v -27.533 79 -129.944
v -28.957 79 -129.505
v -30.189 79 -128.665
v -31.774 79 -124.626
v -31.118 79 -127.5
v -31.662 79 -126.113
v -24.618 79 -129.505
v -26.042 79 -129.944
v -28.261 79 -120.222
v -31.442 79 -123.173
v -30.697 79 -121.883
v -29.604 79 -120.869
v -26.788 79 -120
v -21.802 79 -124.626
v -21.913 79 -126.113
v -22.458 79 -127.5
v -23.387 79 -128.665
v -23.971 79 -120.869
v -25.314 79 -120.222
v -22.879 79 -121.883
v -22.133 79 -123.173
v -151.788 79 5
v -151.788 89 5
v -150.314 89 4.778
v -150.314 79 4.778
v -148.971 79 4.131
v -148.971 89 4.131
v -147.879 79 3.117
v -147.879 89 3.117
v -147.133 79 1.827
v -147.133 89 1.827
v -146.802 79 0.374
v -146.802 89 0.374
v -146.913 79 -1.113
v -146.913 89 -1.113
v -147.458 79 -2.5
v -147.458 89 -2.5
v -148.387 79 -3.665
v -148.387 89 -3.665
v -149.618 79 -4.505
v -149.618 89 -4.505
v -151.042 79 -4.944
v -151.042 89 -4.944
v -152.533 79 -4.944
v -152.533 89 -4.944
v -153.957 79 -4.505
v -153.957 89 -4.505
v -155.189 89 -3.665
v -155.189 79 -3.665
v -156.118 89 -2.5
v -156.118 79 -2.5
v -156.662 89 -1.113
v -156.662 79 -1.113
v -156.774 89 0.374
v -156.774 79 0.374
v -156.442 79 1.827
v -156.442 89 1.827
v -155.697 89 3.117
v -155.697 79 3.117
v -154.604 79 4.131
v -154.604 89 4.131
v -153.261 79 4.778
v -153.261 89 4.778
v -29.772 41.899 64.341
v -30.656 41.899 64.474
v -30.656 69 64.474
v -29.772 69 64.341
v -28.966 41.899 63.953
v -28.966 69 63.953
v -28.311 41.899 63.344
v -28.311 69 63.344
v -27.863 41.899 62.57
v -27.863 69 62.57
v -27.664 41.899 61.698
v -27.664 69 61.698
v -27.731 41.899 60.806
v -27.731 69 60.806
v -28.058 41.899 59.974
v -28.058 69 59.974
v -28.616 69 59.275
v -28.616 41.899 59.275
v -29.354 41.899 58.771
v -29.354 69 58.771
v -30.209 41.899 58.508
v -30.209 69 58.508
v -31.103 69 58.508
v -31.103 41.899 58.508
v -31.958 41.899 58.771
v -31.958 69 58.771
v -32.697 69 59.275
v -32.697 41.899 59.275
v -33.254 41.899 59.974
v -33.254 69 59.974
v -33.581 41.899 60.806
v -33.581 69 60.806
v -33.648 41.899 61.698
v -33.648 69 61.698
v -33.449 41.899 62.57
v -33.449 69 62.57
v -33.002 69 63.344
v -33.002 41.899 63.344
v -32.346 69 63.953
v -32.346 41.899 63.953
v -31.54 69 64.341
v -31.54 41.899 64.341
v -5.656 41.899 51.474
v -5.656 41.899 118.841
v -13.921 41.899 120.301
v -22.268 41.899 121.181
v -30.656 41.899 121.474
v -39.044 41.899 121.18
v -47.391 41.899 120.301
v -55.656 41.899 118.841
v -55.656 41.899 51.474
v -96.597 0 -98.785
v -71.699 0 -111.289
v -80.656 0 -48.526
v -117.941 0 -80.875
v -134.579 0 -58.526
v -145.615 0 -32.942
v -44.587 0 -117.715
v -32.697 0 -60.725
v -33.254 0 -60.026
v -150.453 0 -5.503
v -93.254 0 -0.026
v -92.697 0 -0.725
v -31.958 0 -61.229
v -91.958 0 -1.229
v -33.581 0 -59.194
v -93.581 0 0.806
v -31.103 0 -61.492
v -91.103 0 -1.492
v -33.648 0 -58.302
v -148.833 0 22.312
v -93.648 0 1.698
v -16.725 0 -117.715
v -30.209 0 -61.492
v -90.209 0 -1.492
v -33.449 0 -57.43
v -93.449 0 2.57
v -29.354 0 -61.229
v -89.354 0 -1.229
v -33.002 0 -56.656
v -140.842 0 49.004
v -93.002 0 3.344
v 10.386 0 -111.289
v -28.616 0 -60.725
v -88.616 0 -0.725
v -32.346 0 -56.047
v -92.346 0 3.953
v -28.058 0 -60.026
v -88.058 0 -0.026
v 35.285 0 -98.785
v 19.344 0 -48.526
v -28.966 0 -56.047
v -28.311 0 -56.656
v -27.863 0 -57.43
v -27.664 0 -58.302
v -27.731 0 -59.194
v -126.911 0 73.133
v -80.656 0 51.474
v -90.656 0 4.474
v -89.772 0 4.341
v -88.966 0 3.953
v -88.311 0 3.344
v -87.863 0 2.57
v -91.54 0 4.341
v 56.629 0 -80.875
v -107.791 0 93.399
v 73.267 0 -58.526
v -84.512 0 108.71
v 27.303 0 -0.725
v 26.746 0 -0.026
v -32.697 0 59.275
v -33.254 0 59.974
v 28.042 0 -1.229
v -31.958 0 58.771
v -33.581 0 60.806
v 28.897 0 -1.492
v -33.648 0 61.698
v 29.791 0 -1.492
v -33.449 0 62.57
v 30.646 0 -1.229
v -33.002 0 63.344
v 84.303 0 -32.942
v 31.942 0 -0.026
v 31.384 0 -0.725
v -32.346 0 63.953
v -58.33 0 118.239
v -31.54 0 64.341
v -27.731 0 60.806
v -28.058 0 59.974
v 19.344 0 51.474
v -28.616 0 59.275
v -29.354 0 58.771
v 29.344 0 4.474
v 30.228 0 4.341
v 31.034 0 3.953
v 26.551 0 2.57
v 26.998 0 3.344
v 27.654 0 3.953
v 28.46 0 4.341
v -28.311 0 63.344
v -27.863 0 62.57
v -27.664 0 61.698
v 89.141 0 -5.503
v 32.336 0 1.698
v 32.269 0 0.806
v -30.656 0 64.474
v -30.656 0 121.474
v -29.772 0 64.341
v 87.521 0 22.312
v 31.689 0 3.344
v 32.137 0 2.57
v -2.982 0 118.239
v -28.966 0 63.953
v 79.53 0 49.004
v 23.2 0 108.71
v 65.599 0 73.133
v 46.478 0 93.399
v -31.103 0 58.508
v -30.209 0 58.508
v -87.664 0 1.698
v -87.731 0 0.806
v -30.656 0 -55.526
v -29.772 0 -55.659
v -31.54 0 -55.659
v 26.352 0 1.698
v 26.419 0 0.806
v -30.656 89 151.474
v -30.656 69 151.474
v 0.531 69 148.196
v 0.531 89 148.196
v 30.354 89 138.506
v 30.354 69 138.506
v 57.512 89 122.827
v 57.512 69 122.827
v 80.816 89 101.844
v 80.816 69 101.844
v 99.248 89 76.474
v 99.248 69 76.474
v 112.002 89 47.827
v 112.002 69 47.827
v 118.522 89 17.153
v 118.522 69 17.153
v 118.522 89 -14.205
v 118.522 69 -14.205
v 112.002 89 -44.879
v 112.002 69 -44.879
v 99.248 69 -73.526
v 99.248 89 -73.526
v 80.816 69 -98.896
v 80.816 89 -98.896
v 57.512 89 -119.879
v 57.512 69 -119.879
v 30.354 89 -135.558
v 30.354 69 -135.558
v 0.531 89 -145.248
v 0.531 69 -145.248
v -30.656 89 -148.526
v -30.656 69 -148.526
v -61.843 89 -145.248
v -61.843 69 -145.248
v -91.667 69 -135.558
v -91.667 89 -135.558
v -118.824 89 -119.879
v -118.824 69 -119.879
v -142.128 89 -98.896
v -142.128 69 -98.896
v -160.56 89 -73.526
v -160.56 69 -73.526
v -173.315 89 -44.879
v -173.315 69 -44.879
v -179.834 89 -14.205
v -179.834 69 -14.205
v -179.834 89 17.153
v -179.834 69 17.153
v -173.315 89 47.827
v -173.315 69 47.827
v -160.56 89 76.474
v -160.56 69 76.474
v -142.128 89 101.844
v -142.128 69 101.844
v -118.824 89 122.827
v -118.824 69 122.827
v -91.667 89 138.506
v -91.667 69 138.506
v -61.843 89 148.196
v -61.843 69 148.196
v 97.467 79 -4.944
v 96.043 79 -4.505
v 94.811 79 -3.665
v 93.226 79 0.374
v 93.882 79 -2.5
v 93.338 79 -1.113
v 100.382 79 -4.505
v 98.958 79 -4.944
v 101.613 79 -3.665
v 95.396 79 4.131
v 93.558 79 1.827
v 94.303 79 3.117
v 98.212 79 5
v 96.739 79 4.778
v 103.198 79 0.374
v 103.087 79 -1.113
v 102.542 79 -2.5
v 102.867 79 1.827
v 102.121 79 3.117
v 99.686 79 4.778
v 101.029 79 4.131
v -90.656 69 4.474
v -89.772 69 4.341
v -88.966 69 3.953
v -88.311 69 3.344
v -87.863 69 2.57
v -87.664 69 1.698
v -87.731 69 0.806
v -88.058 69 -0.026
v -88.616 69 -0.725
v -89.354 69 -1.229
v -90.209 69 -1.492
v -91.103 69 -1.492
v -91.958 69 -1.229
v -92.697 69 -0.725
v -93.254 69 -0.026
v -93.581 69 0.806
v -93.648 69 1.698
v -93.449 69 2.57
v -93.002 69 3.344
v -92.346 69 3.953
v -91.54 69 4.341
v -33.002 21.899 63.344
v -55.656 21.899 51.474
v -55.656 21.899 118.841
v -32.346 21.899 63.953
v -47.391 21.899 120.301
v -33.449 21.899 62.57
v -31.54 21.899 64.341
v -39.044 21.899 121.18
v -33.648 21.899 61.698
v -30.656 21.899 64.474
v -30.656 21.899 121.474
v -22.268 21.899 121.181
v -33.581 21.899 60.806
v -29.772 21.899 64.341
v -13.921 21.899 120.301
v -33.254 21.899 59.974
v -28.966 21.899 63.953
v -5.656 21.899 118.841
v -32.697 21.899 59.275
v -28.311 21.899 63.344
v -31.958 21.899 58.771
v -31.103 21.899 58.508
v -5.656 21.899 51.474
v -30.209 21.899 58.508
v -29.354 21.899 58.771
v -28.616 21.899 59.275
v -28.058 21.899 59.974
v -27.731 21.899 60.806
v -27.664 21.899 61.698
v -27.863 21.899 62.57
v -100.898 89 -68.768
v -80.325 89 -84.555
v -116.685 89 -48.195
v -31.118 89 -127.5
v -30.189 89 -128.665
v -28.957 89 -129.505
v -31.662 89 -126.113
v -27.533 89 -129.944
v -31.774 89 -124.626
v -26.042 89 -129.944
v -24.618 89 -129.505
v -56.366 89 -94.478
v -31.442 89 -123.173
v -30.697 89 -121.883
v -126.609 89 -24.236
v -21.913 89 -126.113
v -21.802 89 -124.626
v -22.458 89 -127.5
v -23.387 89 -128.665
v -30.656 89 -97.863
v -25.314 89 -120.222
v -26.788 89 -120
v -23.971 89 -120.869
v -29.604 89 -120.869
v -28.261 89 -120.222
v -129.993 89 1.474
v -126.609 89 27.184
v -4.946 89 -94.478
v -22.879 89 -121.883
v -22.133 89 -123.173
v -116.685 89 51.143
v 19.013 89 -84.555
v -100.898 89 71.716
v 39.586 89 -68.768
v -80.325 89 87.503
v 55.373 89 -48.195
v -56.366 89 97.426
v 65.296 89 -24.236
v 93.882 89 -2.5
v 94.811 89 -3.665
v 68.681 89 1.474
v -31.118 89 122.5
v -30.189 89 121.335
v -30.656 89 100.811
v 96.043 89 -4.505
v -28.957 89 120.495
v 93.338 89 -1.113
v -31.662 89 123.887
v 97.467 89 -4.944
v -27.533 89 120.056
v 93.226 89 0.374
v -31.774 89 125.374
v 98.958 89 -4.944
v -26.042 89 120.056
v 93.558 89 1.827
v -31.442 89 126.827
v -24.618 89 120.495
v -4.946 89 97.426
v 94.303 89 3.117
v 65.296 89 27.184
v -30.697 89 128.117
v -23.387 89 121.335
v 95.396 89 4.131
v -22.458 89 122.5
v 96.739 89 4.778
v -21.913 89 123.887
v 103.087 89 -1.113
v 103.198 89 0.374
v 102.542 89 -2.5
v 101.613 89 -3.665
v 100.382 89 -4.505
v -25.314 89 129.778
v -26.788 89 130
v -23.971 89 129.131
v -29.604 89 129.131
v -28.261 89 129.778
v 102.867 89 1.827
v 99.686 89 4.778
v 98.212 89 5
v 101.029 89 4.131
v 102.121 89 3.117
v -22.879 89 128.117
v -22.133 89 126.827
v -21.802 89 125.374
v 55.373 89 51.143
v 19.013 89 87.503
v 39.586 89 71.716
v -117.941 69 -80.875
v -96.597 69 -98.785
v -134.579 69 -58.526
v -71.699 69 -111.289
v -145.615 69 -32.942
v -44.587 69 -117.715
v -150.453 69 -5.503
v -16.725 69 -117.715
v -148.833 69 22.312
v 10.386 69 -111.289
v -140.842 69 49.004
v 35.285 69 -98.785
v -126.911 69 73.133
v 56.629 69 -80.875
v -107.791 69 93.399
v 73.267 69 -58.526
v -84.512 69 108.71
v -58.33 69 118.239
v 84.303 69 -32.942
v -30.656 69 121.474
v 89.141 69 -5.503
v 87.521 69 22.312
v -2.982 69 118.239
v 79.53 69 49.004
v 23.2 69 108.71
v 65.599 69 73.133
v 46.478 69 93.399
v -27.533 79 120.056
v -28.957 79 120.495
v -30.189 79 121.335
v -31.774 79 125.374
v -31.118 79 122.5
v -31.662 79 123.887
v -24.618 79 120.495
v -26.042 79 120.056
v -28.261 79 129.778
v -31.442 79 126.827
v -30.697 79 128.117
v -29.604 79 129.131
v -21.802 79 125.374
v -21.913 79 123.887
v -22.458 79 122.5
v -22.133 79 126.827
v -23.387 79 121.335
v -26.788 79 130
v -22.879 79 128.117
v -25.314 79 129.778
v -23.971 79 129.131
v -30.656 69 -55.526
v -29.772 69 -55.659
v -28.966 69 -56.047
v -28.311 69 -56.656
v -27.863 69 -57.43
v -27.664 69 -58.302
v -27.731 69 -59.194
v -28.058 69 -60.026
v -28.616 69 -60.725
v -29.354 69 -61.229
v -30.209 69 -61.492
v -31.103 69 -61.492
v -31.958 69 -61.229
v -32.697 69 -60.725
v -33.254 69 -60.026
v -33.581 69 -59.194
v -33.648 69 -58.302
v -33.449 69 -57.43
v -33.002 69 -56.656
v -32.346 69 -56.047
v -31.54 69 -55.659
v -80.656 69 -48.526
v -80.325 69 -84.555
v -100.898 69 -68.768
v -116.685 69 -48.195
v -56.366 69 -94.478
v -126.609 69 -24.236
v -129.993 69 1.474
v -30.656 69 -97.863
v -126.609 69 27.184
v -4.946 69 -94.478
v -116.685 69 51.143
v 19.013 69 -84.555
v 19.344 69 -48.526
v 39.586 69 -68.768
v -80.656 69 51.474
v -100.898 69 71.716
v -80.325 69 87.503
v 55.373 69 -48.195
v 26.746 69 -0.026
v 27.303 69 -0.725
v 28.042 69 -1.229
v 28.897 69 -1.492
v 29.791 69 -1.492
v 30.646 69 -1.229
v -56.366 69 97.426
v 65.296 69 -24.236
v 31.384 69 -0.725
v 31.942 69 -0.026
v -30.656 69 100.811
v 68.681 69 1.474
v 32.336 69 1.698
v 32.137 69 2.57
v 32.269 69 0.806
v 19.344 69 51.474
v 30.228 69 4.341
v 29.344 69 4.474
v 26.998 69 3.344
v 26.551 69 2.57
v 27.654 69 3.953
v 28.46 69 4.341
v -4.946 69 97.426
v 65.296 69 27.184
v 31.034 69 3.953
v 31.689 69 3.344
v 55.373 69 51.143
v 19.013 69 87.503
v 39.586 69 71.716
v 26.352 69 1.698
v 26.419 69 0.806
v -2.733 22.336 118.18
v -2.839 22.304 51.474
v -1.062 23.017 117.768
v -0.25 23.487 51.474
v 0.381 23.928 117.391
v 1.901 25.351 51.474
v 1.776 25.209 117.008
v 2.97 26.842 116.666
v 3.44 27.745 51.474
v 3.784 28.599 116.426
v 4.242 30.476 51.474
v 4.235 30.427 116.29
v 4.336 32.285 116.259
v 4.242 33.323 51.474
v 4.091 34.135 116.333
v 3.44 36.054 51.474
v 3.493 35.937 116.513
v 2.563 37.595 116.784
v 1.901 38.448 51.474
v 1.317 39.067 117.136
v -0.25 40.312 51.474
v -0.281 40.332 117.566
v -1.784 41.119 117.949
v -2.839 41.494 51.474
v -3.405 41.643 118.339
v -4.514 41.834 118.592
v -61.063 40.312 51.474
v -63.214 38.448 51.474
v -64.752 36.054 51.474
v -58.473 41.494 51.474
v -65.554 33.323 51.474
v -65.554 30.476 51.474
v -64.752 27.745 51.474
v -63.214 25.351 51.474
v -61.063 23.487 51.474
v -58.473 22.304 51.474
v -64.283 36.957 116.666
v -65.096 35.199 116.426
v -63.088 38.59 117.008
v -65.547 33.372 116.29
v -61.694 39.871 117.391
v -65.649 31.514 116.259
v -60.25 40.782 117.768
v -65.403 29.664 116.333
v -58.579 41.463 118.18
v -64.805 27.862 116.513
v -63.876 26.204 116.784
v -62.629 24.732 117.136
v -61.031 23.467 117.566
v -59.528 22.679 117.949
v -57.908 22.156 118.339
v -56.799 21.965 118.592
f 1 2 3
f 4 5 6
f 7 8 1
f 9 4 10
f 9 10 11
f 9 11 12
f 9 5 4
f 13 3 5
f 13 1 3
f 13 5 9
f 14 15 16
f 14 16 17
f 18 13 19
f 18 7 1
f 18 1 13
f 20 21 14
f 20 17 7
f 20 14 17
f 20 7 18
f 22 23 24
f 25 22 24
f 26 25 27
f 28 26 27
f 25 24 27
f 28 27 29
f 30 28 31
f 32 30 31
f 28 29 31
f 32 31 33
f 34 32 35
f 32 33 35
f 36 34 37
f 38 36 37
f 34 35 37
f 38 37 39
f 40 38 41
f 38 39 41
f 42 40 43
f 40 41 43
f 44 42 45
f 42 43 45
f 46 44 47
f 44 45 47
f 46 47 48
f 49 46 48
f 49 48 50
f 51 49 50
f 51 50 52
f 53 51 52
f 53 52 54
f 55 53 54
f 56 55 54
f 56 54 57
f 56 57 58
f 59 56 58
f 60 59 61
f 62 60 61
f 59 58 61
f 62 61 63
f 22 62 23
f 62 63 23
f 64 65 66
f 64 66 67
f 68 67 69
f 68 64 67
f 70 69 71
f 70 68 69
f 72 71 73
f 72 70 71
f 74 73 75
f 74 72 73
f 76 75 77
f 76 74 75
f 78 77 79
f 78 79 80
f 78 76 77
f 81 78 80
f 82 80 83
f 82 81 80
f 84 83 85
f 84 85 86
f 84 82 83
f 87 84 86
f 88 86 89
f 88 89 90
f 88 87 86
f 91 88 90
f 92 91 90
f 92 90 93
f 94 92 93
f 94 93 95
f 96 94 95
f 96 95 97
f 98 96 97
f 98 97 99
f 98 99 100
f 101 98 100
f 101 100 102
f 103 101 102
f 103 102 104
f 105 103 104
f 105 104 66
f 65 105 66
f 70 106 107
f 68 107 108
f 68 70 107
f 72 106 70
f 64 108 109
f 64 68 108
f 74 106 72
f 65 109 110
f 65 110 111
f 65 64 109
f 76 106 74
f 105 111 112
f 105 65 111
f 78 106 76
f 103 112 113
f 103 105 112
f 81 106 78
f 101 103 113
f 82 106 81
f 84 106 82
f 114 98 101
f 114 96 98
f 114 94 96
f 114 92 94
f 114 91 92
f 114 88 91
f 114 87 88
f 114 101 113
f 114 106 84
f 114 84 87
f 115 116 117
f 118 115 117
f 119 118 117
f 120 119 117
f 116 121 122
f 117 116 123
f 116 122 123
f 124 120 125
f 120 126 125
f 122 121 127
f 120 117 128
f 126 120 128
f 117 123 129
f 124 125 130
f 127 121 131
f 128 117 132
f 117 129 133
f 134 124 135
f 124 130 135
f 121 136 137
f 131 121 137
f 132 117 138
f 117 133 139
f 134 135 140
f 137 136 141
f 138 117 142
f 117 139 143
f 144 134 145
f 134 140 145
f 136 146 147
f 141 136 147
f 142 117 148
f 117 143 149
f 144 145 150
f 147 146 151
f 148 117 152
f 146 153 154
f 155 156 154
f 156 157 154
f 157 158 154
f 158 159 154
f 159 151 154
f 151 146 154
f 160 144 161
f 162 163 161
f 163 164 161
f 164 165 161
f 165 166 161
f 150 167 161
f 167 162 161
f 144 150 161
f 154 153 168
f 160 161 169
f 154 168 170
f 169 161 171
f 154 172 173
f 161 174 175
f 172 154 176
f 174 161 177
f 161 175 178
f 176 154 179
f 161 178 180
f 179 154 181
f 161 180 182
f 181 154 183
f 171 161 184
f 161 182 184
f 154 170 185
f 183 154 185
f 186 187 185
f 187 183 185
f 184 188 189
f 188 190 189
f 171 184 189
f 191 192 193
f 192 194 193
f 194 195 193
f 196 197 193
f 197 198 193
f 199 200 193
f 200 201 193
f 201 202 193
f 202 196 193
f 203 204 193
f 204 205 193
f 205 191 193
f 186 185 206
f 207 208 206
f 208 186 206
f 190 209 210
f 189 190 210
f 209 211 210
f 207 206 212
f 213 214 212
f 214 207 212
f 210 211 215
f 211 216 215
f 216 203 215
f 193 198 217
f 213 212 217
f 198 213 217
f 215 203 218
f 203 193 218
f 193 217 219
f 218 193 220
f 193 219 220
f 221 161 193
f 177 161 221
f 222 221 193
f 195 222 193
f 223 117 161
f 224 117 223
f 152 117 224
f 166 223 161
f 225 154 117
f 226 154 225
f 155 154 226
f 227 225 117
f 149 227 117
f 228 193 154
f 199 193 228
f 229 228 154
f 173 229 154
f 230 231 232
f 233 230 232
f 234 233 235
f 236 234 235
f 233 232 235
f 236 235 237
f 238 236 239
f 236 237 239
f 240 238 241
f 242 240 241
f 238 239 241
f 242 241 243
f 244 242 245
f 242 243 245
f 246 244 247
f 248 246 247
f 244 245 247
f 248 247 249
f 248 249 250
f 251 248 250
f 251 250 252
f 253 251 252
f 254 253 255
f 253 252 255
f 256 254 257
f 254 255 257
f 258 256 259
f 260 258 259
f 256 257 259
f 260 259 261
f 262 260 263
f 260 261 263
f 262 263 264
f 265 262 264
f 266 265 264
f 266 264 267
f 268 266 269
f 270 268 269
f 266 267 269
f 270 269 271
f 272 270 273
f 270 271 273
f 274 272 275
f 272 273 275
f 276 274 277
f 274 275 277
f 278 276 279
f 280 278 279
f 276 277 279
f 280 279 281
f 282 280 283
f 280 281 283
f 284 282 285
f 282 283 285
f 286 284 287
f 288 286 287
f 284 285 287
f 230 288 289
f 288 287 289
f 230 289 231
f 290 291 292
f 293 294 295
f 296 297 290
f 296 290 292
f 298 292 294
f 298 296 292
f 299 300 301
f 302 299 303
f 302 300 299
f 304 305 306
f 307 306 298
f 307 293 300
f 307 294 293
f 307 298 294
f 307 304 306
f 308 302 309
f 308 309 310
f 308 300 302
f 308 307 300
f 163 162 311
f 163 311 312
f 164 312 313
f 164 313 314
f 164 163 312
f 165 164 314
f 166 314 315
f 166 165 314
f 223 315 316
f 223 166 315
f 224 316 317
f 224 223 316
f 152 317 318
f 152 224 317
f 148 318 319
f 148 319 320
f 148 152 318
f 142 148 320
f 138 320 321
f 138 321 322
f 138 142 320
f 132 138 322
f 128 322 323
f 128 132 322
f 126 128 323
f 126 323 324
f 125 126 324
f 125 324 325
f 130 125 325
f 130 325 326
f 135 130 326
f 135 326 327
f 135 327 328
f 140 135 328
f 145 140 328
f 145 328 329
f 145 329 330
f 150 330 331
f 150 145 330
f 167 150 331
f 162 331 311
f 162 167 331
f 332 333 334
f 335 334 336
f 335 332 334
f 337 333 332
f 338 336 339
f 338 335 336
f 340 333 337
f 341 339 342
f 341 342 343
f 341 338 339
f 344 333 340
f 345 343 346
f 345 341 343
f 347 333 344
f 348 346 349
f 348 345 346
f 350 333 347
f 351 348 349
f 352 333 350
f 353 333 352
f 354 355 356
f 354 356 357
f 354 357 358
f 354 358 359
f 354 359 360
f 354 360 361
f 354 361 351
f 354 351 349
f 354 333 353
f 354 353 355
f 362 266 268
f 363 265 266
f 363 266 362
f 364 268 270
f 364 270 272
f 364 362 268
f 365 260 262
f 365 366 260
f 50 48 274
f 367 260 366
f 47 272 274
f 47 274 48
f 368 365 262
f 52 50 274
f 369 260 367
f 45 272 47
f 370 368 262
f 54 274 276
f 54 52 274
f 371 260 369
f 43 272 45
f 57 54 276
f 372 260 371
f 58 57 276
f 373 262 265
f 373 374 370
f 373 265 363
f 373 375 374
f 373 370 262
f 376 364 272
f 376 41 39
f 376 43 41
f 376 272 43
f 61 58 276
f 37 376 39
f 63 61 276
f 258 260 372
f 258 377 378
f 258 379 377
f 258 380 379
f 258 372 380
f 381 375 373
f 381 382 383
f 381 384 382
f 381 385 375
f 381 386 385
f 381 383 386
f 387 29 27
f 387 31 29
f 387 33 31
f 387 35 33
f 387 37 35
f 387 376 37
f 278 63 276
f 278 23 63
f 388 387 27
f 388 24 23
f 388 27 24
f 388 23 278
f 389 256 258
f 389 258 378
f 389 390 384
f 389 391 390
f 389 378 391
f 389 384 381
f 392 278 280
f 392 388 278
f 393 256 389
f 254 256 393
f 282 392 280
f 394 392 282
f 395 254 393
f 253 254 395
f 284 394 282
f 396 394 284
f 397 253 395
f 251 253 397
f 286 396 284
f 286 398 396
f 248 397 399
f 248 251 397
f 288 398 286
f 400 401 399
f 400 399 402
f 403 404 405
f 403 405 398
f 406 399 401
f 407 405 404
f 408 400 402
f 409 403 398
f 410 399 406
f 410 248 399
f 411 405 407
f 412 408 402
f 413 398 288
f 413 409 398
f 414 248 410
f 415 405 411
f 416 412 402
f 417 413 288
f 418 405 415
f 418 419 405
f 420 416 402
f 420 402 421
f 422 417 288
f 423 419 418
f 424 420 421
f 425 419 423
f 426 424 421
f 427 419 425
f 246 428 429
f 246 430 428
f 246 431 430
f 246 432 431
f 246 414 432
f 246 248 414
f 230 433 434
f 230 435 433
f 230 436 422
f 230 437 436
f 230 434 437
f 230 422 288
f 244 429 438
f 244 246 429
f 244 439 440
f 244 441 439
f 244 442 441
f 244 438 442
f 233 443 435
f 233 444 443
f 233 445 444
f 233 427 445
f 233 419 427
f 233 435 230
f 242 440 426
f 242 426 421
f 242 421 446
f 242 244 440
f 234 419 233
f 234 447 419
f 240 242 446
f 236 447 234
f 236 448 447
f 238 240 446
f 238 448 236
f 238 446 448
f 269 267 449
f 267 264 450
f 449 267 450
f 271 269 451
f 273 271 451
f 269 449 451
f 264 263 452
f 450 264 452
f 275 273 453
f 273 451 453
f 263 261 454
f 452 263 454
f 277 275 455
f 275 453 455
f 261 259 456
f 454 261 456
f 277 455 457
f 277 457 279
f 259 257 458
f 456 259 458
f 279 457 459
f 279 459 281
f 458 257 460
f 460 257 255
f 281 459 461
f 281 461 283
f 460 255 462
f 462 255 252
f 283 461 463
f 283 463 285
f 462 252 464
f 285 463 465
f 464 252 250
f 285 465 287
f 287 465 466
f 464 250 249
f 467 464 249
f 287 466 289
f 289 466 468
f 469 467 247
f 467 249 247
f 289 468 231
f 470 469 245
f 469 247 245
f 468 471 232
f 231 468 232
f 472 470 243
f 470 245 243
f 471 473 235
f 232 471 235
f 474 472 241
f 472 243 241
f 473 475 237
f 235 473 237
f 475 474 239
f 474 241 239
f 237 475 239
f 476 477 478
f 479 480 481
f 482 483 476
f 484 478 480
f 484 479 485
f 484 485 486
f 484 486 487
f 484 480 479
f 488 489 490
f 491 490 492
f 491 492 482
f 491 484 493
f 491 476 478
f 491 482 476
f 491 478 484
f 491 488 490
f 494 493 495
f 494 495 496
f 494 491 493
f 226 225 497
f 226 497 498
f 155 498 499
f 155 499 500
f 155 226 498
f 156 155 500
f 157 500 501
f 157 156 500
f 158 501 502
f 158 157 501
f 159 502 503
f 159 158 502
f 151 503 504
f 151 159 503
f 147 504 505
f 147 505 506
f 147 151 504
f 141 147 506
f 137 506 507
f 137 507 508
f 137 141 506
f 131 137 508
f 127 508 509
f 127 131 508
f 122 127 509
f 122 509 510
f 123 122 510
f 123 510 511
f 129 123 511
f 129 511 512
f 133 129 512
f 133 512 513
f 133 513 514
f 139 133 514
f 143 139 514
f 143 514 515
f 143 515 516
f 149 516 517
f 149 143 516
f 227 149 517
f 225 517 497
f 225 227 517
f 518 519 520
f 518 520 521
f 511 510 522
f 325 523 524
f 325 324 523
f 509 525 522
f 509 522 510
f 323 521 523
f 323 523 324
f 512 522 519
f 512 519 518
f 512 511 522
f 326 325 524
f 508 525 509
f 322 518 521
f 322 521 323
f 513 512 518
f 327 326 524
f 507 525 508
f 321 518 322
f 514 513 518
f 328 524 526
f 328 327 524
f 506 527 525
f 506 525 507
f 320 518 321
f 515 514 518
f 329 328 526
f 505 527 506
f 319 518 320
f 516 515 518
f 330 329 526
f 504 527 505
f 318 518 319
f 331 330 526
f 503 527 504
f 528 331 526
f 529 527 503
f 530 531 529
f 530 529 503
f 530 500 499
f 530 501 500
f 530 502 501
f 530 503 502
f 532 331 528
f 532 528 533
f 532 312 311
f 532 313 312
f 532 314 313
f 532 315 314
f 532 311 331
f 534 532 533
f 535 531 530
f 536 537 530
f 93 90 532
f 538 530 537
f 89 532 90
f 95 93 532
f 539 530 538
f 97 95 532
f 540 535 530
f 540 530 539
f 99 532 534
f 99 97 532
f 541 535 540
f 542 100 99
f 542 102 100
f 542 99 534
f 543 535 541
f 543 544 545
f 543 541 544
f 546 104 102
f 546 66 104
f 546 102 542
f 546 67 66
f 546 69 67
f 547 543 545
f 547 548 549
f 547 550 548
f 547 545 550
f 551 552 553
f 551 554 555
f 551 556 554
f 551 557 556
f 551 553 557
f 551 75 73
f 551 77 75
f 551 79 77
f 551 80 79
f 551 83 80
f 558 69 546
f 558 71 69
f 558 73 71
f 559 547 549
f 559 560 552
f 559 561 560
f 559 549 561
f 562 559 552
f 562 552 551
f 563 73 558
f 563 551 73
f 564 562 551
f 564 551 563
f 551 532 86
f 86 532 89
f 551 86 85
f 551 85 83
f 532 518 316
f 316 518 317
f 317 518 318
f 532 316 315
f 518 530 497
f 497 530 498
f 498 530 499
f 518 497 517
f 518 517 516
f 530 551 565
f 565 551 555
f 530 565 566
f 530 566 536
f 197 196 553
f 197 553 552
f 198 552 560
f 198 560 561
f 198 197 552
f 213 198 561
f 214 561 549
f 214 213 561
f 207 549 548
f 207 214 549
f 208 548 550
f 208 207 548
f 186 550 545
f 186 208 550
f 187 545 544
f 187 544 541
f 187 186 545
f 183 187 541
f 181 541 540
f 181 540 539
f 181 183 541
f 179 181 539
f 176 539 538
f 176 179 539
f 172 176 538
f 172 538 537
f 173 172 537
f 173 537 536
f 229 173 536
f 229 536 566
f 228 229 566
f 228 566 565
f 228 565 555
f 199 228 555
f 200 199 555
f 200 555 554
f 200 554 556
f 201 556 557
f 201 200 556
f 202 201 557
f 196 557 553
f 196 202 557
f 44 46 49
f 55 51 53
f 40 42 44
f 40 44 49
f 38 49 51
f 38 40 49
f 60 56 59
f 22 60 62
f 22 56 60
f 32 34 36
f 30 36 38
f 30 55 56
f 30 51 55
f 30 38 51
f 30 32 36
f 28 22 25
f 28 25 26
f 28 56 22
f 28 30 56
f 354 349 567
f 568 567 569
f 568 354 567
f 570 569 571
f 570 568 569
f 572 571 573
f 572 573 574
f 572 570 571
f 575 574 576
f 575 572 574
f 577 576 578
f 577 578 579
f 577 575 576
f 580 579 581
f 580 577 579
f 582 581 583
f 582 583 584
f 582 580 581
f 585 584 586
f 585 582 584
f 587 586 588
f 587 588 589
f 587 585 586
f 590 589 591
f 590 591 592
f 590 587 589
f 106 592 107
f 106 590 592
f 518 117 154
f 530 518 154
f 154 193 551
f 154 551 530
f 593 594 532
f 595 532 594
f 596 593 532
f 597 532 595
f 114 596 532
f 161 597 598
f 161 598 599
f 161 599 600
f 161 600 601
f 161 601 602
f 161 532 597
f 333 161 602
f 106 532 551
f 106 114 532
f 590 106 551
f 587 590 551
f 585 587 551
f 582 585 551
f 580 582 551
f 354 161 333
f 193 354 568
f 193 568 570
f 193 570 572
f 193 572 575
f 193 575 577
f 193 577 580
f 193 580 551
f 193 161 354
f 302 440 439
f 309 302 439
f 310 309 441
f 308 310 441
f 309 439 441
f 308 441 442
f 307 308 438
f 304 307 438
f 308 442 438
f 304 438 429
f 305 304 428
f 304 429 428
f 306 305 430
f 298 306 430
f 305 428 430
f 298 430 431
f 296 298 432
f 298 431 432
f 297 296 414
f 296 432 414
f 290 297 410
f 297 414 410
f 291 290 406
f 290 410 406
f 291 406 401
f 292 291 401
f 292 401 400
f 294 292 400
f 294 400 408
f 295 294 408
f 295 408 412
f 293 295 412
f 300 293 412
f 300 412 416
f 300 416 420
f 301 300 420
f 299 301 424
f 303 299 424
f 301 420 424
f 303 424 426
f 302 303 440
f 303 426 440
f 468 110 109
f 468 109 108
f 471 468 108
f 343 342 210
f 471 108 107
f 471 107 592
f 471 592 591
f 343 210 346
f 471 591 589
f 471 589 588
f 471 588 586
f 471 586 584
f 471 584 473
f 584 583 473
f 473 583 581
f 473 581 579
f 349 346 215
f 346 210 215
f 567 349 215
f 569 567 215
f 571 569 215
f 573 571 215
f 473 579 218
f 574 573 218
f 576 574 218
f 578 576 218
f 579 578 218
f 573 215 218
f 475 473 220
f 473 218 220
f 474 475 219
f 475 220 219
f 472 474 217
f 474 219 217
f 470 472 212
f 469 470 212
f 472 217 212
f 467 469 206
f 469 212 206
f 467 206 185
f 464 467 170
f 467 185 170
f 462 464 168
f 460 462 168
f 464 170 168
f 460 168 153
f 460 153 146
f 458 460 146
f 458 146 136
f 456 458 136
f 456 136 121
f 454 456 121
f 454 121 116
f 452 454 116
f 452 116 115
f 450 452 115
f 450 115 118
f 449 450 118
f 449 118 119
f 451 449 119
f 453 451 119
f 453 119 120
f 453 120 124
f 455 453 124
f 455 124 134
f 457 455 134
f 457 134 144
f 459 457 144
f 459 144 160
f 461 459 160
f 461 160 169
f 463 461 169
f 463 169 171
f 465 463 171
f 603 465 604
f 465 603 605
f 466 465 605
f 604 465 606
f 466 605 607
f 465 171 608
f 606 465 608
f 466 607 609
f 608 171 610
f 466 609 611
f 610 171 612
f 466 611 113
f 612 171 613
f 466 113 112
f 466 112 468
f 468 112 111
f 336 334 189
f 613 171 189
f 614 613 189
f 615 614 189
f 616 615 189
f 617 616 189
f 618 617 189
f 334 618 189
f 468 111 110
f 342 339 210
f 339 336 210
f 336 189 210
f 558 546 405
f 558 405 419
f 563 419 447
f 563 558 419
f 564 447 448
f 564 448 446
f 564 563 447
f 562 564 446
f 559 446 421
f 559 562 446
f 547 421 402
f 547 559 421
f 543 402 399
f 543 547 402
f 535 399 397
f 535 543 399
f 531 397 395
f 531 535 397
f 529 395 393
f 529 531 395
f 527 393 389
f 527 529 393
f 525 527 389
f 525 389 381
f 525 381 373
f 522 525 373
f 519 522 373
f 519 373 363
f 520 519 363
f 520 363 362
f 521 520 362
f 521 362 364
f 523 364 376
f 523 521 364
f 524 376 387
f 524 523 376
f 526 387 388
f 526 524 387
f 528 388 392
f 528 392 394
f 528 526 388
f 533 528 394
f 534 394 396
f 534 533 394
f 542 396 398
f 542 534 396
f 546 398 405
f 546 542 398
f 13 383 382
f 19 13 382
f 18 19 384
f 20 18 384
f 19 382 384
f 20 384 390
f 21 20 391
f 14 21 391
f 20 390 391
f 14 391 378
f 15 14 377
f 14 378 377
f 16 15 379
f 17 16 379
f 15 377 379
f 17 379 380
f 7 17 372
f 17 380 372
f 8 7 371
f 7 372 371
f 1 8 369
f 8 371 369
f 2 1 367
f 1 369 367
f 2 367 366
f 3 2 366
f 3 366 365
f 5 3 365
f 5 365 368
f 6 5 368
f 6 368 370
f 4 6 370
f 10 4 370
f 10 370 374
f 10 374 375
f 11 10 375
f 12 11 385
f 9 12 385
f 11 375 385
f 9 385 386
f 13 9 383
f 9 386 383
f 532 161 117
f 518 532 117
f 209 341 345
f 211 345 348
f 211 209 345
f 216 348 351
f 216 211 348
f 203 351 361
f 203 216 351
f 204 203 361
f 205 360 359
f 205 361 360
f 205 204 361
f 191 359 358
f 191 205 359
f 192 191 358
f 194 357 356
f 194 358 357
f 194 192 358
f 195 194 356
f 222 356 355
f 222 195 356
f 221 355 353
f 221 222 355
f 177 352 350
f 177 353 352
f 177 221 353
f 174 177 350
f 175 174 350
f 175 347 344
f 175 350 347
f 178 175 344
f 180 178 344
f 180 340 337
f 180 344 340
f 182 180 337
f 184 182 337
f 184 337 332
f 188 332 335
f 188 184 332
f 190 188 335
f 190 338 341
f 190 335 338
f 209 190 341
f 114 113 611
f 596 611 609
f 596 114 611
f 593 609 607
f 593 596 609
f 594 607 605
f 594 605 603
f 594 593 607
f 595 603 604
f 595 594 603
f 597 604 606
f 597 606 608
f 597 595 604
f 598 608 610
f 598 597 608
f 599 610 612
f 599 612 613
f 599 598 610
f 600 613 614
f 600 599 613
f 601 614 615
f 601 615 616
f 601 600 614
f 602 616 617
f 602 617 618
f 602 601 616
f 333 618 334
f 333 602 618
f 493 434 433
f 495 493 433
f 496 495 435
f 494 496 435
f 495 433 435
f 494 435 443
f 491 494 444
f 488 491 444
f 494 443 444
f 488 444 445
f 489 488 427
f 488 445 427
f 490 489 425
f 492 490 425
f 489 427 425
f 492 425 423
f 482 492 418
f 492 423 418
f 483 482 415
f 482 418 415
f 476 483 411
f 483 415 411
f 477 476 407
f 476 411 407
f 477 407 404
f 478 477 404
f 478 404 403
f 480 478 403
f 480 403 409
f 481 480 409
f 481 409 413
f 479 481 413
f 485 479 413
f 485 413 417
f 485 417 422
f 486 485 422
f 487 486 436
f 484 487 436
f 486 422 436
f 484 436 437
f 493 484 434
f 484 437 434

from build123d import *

# Parameters (mm, degrees)
SKETCH_1_R           = 120
SKETCH_1_R_2         = 3
SKETCH_1_W           = 100
SKETCH_1_H           = 100
EXTRUDE_3_DEPTH      = 69
SKETCH_8_R           = 150
SKETCH_8_R_2         = 99.33727818
EXTRUDE_6_DEPTH      = 20
SKETCH_9_R           = 5
CUT_EXTRUDE_11_DEPTH = 10
CUT_EXTRUDE_12_DEPTH = 76


with BuildPart() as part:
    # 草图1 → 凸台-拉伸3 (new body)
    with BuildSketch(Plane(origin=(0, 0, 0), x_dir=(1, 0, 0), z_dir=(0, 1, 0))):
        with Locations(Location((-30.656096769, -1.474017122, 0), (0, 0, 270))):
            Circle(SKETCH_1_R)
        with Locations(Location((-90.656096769, -1.474017122, 0), (0, 0, 270))):
            Circle(SKETCH_1_R_2, mode=Mode.SUBTRACT)
        with Locations(Location((29.343903231, -1.474017122, 0), (0, 0, 270))):
            Circle(SKETCH_1_R_2, mode=Mode.SUBTRACT)
        with Locations(Location((-30.656096769, -61.474017122, 0), (0, 0, 270))):
            Circle(SKETCH_1_R_2, mode=Mode.SUBTRACT)
        with Locations(Location((-30.656096769, 58.525982878, 0), (0, 0, 270))):
            Circle(SKETCH_1_R_2, mode=Mode.SUBTRACT)
        with Locations((-30.656096769, -1.474017122)):
            Rectangle(SKETCH_1_W, SKETCH_1_H, mode=Mode.SUBTRACT)
    extrude(amount=EXTRUDE_3_DEPTH)

    # 草图8 → 凸台-拉伸6 (add)
    with BuildSketch(Plane(origin=(0, 69, 0), x_dir=(1, 0, 0), z_dir=(0, 1, 0))):
        with Locations(Location((-30.656096769, -1.474017122, 0), (0, 0, 270))):
            Circle(SKETCH_8_R)
        with Locations(Location((-30.656096769, -1.474017122, 0), (0, 0, 270))):
            Circle(SKETCH_8_R_2, mode=Mode.SUBTRACT)
    extrude(amount=EXTRUDE_6_DEPTH)

    # 草图9 → 切除-拉伸11 (cut)
    with BuildSketch(Plane(origin=(0, 89, 0), x_dir=(1, 0, 0), z_dir=(0, 1, 0))):
        with Locations(Location((-26.787702046, 125, 0), (0, 0, 270))):
            Circle(SKETCH_9_R)
        with Locations(Location((98.212297954, 0, 0), (0, 0, 270))):
            Circle(SKETCH_9_R)
        with Locations(Location((-26.787702046, -125, 0), (0, 0, 270))):
            Circle(SKETCH_9_R)
        with Locations(Location((-151.787702046, 0, 0), (0, 0, 270))):
            Circle(SKETCH_9_R)
    extrude(amount=-CUT_EXTRUDE_11_DEPTH, mode=Mode.SUBTRACT)

    # 草图10 → 切除-拉伸12 (cut)
    with BuildSketch(Plane(origin=(0, 0, 51.474017122), x_dir=(-1, 0, 0), z_dir=(0, 0, -1))):
        with BuildLine():
            Line((55.656096769, 21.899366297), (5.656196663, 21.899366297))
            ThreePointArc((5.656196663, 21.899366297), (-4.343803337, 31.899366297), (5.656196663, 41.899366297))
            Line((5.656196663, 41.899366297), (55.656096769, 41.899366297))
            ThreePointArc((55.656096769, 41.899366297), (65.656096769, 31.899366297), (55.656096769, 21.899366297))
        make_face()
    extrude(amount=-CUT_EXTRUDE_12_DEPTH, mode=Mode.SUBTRACT)


solid = part.part
